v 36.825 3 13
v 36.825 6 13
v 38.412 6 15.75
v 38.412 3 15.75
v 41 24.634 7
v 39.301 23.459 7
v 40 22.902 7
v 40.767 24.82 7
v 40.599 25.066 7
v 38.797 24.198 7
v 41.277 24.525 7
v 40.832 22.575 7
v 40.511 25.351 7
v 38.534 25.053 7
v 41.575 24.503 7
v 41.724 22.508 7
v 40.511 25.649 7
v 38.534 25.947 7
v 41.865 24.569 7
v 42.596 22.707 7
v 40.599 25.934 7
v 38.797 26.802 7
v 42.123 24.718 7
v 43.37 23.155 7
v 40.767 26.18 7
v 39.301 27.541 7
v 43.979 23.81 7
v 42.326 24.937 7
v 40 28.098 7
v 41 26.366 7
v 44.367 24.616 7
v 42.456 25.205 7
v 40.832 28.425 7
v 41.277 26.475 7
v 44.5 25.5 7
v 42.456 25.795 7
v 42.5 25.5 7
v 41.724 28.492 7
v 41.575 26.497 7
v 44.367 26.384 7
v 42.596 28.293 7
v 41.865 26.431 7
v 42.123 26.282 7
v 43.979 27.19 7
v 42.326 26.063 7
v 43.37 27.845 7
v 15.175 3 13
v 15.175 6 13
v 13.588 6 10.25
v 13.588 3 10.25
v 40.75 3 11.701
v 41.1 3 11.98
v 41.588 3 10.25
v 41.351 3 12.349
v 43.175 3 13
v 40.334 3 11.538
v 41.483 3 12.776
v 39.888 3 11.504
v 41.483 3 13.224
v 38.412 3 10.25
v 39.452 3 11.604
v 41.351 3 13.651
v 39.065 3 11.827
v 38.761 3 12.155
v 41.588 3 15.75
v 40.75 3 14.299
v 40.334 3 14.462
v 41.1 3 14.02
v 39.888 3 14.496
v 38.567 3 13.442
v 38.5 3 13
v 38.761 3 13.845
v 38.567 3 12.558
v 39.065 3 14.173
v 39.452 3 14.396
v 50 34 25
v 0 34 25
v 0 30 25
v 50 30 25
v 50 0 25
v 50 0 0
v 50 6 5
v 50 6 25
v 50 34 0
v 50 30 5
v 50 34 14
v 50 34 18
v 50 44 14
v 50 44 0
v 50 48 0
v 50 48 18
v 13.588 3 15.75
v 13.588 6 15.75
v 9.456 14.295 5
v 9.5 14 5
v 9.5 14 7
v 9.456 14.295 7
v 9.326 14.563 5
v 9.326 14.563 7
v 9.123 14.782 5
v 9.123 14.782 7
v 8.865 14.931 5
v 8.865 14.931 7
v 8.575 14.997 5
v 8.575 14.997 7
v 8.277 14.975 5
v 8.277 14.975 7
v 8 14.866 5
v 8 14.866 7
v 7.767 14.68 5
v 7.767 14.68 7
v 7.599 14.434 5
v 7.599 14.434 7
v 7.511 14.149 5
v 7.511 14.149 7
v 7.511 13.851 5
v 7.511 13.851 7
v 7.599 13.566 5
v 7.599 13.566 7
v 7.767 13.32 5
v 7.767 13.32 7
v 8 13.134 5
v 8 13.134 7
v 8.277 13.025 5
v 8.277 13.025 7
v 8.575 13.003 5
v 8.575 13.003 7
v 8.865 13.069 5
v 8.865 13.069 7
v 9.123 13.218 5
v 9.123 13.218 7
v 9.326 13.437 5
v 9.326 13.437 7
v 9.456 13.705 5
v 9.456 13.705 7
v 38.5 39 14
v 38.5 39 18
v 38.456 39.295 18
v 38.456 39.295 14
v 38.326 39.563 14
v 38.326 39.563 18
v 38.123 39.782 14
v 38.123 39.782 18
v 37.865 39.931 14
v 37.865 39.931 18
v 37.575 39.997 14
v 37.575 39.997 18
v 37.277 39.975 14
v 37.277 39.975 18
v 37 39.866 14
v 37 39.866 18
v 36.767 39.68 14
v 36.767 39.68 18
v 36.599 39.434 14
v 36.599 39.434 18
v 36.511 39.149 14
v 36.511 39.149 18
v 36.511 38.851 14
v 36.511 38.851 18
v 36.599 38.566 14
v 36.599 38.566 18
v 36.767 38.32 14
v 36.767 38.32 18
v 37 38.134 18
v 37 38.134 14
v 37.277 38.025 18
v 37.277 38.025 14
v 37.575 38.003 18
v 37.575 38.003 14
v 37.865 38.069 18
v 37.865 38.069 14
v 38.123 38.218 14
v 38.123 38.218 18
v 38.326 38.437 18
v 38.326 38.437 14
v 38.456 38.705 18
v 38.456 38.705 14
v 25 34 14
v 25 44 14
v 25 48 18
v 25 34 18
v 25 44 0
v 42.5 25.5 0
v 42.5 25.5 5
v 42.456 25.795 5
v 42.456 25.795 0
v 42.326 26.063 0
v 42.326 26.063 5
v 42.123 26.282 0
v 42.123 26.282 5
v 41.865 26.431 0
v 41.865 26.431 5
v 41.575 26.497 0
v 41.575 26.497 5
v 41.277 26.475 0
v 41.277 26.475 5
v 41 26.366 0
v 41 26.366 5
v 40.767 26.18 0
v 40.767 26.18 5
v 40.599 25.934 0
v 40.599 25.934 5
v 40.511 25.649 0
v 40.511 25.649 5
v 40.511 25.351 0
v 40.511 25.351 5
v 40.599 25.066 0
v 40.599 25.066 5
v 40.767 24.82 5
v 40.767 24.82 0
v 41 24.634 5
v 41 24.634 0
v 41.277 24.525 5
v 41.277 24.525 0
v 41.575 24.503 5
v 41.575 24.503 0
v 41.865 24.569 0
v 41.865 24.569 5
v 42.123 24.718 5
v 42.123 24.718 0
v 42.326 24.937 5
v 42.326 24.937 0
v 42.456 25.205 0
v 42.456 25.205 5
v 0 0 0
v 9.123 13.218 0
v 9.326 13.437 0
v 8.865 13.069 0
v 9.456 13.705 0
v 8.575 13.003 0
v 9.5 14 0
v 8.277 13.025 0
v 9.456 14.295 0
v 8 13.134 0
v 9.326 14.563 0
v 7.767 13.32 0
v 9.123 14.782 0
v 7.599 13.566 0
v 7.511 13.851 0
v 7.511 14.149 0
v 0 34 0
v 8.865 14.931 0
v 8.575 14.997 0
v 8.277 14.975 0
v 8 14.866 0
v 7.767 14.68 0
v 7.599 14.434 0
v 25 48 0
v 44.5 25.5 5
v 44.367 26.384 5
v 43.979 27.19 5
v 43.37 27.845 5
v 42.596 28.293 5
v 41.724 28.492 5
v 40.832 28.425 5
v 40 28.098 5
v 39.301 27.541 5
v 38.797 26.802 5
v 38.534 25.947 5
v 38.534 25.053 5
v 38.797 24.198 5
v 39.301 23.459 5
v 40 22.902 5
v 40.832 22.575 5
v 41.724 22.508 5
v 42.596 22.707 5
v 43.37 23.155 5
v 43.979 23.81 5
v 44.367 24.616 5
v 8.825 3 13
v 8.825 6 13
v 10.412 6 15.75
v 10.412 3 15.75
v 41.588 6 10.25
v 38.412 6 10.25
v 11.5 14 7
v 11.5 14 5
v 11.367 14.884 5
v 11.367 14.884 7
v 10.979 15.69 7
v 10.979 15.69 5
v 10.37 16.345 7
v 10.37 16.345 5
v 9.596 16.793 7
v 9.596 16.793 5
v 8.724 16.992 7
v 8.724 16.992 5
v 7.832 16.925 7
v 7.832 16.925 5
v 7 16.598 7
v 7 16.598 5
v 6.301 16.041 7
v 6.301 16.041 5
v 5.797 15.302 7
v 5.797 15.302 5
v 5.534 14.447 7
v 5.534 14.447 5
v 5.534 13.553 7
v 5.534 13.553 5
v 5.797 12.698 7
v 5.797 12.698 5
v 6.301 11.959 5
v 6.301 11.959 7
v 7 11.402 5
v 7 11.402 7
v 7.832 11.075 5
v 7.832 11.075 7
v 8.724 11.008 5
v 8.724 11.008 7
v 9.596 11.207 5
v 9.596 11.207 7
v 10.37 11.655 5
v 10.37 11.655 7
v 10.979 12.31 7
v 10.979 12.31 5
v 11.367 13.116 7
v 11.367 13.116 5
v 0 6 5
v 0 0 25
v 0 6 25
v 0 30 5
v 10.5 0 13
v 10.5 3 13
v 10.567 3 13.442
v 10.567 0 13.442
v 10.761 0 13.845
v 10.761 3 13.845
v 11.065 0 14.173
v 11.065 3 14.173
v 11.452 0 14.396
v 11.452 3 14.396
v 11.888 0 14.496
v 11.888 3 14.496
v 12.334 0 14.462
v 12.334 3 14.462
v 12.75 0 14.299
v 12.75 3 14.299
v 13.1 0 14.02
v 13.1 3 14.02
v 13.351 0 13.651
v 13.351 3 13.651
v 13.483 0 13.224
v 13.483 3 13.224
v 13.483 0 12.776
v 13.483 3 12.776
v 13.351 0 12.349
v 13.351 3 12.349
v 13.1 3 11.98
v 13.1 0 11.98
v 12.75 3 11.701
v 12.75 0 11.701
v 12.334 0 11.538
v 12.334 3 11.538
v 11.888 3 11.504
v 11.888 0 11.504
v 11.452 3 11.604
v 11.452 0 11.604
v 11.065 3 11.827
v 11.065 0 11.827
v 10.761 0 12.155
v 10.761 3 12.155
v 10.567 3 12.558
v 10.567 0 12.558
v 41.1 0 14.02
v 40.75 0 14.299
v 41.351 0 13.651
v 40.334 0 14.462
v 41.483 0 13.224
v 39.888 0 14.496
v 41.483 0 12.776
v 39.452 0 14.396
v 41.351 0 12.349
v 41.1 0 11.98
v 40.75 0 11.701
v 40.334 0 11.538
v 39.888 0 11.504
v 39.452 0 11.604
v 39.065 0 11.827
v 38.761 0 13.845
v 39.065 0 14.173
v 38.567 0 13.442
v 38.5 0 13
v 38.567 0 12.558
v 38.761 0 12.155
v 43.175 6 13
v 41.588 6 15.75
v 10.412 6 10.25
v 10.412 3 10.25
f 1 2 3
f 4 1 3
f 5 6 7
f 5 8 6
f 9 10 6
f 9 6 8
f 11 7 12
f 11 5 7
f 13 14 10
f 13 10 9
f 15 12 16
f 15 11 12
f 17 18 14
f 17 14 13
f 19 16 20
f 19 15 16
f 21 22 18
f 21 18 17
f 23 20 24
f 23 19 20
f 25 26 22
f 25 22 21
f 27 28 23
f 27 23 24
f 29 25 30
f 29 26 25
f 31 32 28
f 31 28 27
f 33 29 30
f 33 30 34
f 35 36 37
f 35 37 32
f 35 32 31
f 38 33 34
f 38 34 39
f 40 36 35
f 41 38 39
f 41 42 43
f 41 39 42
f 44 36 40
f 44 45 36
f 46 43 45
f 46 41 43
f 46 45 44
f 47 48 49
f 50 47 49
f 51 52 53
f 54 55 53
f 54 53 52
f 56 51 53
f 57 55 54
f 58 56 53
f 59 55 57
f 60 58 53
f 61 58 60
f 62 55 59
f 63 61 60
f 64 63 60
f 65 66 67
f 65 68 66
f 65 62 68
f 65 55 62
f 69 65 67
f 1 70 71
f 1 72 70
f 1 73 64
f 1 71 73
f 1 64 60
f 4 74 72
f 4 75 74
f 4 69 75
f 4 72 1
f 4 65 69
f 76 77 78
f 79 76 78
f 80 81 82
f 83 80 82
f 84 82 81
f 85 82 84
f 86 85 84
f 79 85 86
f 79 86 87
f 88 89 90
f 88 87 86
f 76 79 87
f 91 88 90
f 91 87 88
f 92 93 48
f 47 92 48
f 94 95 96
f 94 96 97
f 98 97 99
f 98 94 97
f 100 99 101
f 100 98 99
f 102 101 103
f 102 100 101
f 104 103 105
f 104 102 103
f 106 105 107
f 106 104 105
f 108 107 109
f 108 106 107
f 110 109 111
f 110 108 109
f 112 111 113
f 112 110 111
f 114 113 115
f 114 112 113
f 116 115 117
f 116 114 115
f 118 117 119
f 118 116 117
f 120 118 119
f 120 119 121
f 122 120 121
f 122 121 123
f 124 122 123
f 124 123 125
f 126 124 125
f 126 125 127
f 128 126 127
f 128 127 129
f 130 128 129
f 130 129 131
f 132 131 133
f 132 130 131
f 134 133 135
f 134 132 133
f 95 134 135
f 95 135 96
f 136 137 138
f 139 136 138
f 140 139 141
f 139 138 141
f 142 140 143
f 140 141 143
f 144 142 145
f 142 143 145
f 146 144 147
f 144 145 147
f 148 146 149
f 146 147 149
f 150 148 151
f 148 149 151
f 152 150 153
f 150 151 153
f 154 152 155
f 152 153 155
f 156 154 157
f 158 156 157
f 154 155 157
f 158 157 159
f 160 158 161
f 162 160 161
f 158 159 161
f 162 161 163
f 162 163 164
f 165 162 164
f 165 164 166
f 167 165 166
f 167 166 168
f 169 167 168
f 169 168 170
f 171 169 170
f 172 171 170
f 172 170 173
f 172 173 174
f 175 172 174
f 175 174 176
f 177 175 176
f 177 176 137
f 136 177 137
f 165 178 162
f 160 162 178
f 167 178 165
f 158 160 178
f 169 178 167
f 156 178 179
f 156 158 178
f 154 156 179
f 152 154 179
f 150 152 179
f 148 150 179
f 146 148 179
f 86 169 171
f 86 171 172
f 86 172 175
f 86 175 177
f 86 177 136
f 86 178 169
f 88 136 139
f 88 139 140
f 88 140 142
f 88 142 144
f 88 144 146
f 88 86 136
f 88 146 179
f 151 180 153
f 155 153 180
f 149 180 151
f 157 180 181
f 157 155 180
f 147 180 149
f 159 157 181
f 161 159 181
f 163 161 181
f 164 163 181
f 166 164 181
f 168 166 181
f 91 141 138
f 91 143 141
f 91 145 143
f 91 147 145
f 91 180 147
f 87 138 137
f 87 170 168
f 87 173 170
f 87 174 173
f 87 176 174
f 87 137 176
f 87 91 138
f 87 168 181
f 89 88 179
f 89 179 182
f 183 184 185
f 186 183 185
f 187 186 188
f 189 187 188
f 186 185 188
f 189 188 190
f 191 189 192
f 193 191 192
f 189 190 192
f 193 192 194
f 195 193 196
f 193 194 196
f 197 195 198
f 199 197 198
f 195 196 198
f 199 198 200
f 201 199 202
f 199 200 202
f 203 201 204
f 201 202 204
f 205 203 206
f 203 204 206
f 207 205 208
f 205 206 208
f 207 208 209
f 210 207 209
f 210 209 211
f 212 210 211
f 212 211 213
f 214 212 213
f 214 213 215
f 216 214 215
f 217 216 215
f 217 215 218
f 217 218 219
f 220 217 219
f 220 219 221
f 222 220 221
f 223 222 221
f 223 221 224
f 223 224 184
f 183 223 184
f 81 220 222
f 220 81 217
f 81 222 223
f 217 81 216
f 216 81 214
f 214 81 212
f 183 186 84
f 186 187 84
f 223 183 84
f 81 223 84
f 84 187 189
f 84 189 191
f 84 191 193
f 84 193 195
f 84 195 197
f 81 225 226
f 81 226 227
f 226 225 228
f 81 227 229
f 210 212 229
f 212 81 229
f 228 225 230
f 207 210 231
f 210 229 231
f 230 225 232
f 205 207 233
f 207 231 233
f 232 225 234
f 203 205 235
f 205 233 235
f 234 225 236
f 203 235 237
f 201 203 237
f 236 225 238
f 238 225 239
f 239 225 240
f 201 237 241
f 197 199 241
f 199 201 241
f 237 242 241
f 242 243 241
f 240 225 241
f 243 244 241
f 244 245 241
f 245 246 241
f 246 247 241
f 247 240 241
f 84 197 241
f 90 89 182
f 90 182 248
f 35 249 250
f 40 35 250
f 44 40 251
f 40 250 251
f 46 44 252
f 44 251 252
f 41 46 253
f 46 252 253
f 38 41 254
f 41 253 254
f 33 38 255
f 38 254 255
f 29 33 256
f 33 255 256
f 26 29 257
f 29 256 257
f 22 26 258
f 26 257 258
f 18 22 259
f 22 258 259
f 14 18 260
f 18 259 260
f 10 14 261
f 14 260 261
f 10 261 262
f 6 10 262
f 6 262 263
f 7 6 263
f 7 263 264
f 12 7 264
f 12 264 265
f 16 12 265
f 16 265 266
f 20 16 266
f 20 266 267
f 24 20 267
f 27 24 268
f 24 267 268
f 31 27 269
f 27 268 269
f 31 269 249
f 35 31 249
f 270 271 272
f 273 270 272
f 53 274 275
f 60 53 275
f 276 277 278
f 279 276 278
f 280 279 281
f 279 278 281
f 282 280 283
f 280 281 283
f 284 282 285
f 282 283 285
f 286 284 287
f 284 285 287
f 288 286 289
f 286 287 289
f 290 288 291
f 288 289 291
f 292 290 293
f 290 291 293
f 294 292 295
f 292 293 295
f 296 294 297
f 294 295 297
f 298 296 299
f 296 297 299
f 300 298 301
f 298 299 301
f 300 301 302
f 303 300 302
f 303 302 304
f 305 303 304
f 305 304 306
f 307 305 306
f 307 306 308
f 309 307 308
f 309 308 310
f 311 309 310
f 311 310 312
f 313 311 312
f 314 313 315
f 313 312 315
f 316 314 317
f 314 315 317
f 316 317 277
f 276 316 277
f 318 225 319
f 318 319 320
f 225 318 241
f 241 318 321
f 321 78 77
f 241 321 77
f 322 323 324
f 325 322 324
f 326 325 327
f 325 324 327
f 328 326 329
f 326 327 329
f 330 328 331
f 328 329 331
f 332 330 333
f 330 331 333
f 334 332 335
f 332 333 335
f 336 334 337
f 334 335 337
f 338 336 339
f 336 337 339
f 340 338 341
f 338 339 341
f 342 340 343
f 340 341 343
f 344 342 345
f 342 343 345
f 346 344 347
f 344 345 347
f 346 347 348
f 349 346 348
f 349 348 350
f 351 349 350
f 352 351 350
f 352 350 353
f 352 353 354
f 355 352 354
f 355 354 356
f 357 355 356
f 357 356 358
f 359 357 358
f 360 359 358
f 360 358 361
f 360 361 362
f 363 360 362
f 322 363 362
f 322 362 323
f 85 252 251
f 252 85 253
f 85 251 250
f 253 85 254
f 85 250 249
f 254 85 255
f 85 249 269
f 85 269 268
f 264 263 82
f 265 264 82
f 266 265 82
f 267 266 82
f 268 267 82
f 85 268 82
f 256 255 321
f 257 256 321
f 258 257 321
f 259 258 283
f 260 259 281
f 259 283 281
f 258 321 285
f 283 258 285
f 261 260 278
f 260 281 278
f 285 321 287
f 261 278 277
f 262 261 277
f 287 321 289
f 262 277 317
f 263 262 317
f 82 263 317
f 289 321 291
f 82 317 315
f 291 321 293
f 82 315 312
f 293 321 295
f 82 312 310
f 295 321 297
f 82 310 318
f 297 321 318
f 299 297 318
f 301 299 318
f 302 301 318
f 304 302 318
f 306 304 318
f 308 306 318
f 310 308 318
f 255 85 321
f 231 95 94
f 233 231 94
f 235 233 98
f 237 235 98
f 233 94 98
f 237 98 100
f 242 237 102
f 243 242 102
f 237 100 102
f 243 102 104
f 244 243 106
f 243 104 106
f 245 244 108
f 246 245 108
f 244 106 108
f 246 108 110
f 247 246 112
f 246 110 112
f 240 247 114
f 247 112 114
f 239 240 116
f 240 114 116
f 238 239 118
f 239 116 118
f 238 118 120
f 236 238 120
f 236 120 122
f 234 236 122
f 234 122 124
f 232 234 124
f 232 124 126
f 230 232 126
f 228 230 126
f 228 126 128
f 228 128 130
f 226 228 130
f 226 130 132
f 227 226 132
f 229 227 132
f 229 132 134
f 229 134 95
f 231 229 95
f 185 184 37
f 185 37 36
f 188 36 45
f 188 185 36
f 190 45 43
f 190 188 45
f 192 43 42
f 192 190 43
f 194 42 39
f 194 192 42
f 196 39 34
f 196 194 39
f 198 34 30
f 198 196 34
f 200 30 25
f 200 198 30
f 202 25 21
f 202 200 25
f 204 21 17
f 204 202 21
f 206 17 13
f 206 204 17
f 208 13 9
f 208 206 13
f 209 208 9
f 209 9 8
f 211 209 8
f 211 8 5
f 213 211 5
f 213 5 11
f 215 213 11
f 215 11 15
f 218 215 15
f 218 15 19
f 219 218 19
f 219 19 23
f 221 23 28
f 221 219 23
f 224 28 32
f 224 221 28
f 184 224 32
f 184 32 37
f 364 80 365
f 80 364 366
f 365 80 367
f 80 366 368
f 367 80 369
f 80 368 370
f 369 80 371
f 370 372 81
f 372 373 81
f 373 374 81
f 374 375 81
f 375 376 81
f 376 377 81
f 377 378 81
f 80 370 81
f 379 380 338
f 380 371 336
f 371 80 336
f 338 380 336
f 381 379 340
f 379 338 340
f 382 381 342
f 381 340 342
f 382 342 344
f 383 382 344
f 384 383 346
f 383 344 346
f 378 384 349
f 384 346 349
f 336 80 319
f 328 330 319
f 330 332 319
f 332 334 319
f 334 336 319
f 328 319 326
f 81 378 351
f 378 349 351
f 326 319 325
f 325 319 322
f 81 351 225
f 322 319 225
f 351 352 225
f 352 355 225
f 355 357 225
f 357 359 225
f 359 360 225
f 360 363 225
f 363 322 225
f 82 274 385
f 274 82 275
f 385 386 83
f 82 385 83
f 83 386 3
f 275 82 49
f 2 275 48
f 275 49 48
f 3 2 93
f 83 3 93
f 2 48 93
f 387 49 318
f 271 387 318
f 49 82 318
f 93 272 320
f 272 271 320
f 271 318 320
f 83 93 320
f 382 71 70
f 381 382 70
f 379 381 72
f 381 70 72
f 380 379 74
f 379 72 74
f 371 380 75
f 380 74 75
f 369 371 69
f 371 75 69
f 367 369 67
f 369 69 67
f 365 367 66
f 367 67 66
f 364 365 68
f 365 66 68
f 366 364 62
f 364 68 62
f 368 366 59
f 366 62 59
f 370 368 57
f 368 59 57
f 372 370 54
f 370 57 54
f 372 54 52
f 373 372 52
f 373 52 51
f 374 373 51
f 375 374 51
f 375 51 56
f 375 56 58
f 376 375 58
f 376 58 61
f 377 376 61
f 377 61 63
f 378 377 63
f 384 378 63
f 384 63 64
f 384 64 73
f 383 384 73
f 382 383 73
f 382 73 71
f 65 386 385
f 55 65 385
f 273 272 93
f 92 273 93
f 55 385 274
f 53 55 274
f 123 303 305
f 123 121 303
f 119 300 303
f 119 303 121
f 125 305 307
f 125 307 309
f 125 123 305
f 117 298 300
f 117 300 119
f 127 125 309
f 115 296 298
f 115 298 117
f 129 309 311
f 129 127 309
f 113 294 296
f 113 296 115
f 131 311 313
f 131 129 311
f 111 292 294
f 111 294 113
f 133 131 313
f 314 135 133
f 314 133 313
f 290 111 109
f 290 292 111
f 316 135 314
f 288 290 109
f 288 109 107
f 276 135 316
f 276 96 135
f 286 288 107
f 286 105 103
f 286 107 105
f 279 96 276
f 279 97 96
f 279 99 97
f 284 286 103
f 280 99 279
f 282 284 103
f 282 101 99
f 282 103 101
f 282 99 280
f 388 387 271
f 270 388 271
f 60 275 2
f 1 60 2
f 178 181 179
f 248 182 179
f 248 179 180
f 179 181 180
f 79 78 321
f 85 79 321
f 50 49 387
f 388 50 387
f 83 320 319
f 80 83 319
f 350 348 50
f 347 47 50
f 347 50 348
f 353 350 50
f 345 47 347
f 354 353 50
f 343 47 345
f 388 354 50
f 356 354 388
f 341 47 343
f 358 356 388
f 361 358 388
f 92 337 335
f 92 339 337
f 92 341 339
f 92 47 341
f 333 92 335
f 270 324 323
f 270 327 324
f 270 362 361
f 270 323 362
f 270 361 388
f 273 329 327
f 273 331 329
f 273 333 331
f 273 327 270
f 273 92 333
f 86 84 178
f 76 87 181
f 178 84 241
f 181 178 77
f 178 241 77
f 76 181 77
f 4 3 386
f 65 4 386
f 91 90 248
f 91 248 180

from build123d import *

# Parameters (mm, degrees)
F1_DEPTH  = 50
F2_R      = 1.5
F3_DEPTH  = 6.001
F4_DEPTH  = 3
F5_R      = 1
F6_DEPTH  = 5.001
F5_R_2    = 3
F7_DEPTH  = 2
F9_DEPTH  = 25
F10_R     = 1
F11_DEPTH = 18.001


with BuildPart() as f1:
    # F0 (on Right) → F1 (new body)
    with BuildSketch(Plane.YZ):
        Polygon((6, 5), (6, 25), (0, 25), (0, 0), (34, 0), (34, 25), (30, 25), (30, 5), align=None)
    extrude(amount=F1_DEPTH)

    # F2 (on face) → F3 (cut, through all)
    with BuildSketch(Plane(origin=(0, 6, 0), x_dir=(-1, 0, 0), z_dir=(0, 1, 0))):
        with Locations((-40, 13)):
            Circle(F2_R)
        with Locations((-12, 13)):
            Circle(F2_R)
    extrude(amount=-F3_DEPTH, mode=Mode.SUBTRACT)

    # F2 (on face) → F4 (cut, through all)
    with BuildSketch(Plane(origin=(0, 6, 0), x_dir=(-1, 0, 0), z_dir=(0, 1, 0))):
        Polygon((-41.5877132403, 15.75), (-43.1754264805, 13), (-41.5877132403, 10.25), (-38.4122867597, 10.25), (-36.8245735195, 13), (-38.4122867597, 15.75), align=None)
        with Locations((-40, 13)):
            Circle(F2_R, mode=Mode.SUBTRACT)
        Polygon((-13.5877132403, 15.75), (-15.1754264805, 13), (-13.5877132403, 10.25), (-10.4122867597, 10.25), (-8.8245735195, 13), (-10.4122867597, 15.75), align=None)
        with Locations((-12, 13)):
            Circle(F2_R, mode=Mode.SUBTRACT)
    extrude(amount=-F4_DEPTH, mode=Mode.SUBTRACT)

    # F5 (on face) → F6 (cut, through all)
    with BuildSketch(Plane.XY.offset(5)):
        with Locations((8.5, 14)):
            Circle(F5_R)
        with Locations((41.5, 25.5)):
            Circle(F5_R)
    extrude(amount=-F6_DEPTH, mode=Mode.SUBTRACT)

    # F5 (on face) → F7 (join)
    with BuildSketch(Plane.XY.offset(5)):
        with Locations((8.5, 14)):
            Circle(F5_R_2)
        with Locations((8.5, 14)):
            Circle(F5_R, mode=Mode.SUBTRACT)
        with Locations((41.5, 25.5)):
            Circle(F5_R_2)
        with Locations((41.5, 25.5)):
            Circle(F5_R, mode=Mode.SUBTRACT)
    extrude(amount=F7_DEPTH)

    # F8 (on face) → F9 (join)
    with BuildSketch(Plane.YZ.offset(50)):
        Polygon((48, 18), (34, 18), (34, 14), (44, 14), (44, 0), (48, 0), align=None)
    extrude(amount=-F9_DEPTH)

    # F10 (on face) → F11 (cut, through all)
    with BuildSketch(Plane.XY.offset(18)):
        with Locations((37.5, 39)):
            Circle(F10_R)
    extrude(amount=-F11_DEPTH, mode=Mode.SUBTRACT)


solid = f1.part
